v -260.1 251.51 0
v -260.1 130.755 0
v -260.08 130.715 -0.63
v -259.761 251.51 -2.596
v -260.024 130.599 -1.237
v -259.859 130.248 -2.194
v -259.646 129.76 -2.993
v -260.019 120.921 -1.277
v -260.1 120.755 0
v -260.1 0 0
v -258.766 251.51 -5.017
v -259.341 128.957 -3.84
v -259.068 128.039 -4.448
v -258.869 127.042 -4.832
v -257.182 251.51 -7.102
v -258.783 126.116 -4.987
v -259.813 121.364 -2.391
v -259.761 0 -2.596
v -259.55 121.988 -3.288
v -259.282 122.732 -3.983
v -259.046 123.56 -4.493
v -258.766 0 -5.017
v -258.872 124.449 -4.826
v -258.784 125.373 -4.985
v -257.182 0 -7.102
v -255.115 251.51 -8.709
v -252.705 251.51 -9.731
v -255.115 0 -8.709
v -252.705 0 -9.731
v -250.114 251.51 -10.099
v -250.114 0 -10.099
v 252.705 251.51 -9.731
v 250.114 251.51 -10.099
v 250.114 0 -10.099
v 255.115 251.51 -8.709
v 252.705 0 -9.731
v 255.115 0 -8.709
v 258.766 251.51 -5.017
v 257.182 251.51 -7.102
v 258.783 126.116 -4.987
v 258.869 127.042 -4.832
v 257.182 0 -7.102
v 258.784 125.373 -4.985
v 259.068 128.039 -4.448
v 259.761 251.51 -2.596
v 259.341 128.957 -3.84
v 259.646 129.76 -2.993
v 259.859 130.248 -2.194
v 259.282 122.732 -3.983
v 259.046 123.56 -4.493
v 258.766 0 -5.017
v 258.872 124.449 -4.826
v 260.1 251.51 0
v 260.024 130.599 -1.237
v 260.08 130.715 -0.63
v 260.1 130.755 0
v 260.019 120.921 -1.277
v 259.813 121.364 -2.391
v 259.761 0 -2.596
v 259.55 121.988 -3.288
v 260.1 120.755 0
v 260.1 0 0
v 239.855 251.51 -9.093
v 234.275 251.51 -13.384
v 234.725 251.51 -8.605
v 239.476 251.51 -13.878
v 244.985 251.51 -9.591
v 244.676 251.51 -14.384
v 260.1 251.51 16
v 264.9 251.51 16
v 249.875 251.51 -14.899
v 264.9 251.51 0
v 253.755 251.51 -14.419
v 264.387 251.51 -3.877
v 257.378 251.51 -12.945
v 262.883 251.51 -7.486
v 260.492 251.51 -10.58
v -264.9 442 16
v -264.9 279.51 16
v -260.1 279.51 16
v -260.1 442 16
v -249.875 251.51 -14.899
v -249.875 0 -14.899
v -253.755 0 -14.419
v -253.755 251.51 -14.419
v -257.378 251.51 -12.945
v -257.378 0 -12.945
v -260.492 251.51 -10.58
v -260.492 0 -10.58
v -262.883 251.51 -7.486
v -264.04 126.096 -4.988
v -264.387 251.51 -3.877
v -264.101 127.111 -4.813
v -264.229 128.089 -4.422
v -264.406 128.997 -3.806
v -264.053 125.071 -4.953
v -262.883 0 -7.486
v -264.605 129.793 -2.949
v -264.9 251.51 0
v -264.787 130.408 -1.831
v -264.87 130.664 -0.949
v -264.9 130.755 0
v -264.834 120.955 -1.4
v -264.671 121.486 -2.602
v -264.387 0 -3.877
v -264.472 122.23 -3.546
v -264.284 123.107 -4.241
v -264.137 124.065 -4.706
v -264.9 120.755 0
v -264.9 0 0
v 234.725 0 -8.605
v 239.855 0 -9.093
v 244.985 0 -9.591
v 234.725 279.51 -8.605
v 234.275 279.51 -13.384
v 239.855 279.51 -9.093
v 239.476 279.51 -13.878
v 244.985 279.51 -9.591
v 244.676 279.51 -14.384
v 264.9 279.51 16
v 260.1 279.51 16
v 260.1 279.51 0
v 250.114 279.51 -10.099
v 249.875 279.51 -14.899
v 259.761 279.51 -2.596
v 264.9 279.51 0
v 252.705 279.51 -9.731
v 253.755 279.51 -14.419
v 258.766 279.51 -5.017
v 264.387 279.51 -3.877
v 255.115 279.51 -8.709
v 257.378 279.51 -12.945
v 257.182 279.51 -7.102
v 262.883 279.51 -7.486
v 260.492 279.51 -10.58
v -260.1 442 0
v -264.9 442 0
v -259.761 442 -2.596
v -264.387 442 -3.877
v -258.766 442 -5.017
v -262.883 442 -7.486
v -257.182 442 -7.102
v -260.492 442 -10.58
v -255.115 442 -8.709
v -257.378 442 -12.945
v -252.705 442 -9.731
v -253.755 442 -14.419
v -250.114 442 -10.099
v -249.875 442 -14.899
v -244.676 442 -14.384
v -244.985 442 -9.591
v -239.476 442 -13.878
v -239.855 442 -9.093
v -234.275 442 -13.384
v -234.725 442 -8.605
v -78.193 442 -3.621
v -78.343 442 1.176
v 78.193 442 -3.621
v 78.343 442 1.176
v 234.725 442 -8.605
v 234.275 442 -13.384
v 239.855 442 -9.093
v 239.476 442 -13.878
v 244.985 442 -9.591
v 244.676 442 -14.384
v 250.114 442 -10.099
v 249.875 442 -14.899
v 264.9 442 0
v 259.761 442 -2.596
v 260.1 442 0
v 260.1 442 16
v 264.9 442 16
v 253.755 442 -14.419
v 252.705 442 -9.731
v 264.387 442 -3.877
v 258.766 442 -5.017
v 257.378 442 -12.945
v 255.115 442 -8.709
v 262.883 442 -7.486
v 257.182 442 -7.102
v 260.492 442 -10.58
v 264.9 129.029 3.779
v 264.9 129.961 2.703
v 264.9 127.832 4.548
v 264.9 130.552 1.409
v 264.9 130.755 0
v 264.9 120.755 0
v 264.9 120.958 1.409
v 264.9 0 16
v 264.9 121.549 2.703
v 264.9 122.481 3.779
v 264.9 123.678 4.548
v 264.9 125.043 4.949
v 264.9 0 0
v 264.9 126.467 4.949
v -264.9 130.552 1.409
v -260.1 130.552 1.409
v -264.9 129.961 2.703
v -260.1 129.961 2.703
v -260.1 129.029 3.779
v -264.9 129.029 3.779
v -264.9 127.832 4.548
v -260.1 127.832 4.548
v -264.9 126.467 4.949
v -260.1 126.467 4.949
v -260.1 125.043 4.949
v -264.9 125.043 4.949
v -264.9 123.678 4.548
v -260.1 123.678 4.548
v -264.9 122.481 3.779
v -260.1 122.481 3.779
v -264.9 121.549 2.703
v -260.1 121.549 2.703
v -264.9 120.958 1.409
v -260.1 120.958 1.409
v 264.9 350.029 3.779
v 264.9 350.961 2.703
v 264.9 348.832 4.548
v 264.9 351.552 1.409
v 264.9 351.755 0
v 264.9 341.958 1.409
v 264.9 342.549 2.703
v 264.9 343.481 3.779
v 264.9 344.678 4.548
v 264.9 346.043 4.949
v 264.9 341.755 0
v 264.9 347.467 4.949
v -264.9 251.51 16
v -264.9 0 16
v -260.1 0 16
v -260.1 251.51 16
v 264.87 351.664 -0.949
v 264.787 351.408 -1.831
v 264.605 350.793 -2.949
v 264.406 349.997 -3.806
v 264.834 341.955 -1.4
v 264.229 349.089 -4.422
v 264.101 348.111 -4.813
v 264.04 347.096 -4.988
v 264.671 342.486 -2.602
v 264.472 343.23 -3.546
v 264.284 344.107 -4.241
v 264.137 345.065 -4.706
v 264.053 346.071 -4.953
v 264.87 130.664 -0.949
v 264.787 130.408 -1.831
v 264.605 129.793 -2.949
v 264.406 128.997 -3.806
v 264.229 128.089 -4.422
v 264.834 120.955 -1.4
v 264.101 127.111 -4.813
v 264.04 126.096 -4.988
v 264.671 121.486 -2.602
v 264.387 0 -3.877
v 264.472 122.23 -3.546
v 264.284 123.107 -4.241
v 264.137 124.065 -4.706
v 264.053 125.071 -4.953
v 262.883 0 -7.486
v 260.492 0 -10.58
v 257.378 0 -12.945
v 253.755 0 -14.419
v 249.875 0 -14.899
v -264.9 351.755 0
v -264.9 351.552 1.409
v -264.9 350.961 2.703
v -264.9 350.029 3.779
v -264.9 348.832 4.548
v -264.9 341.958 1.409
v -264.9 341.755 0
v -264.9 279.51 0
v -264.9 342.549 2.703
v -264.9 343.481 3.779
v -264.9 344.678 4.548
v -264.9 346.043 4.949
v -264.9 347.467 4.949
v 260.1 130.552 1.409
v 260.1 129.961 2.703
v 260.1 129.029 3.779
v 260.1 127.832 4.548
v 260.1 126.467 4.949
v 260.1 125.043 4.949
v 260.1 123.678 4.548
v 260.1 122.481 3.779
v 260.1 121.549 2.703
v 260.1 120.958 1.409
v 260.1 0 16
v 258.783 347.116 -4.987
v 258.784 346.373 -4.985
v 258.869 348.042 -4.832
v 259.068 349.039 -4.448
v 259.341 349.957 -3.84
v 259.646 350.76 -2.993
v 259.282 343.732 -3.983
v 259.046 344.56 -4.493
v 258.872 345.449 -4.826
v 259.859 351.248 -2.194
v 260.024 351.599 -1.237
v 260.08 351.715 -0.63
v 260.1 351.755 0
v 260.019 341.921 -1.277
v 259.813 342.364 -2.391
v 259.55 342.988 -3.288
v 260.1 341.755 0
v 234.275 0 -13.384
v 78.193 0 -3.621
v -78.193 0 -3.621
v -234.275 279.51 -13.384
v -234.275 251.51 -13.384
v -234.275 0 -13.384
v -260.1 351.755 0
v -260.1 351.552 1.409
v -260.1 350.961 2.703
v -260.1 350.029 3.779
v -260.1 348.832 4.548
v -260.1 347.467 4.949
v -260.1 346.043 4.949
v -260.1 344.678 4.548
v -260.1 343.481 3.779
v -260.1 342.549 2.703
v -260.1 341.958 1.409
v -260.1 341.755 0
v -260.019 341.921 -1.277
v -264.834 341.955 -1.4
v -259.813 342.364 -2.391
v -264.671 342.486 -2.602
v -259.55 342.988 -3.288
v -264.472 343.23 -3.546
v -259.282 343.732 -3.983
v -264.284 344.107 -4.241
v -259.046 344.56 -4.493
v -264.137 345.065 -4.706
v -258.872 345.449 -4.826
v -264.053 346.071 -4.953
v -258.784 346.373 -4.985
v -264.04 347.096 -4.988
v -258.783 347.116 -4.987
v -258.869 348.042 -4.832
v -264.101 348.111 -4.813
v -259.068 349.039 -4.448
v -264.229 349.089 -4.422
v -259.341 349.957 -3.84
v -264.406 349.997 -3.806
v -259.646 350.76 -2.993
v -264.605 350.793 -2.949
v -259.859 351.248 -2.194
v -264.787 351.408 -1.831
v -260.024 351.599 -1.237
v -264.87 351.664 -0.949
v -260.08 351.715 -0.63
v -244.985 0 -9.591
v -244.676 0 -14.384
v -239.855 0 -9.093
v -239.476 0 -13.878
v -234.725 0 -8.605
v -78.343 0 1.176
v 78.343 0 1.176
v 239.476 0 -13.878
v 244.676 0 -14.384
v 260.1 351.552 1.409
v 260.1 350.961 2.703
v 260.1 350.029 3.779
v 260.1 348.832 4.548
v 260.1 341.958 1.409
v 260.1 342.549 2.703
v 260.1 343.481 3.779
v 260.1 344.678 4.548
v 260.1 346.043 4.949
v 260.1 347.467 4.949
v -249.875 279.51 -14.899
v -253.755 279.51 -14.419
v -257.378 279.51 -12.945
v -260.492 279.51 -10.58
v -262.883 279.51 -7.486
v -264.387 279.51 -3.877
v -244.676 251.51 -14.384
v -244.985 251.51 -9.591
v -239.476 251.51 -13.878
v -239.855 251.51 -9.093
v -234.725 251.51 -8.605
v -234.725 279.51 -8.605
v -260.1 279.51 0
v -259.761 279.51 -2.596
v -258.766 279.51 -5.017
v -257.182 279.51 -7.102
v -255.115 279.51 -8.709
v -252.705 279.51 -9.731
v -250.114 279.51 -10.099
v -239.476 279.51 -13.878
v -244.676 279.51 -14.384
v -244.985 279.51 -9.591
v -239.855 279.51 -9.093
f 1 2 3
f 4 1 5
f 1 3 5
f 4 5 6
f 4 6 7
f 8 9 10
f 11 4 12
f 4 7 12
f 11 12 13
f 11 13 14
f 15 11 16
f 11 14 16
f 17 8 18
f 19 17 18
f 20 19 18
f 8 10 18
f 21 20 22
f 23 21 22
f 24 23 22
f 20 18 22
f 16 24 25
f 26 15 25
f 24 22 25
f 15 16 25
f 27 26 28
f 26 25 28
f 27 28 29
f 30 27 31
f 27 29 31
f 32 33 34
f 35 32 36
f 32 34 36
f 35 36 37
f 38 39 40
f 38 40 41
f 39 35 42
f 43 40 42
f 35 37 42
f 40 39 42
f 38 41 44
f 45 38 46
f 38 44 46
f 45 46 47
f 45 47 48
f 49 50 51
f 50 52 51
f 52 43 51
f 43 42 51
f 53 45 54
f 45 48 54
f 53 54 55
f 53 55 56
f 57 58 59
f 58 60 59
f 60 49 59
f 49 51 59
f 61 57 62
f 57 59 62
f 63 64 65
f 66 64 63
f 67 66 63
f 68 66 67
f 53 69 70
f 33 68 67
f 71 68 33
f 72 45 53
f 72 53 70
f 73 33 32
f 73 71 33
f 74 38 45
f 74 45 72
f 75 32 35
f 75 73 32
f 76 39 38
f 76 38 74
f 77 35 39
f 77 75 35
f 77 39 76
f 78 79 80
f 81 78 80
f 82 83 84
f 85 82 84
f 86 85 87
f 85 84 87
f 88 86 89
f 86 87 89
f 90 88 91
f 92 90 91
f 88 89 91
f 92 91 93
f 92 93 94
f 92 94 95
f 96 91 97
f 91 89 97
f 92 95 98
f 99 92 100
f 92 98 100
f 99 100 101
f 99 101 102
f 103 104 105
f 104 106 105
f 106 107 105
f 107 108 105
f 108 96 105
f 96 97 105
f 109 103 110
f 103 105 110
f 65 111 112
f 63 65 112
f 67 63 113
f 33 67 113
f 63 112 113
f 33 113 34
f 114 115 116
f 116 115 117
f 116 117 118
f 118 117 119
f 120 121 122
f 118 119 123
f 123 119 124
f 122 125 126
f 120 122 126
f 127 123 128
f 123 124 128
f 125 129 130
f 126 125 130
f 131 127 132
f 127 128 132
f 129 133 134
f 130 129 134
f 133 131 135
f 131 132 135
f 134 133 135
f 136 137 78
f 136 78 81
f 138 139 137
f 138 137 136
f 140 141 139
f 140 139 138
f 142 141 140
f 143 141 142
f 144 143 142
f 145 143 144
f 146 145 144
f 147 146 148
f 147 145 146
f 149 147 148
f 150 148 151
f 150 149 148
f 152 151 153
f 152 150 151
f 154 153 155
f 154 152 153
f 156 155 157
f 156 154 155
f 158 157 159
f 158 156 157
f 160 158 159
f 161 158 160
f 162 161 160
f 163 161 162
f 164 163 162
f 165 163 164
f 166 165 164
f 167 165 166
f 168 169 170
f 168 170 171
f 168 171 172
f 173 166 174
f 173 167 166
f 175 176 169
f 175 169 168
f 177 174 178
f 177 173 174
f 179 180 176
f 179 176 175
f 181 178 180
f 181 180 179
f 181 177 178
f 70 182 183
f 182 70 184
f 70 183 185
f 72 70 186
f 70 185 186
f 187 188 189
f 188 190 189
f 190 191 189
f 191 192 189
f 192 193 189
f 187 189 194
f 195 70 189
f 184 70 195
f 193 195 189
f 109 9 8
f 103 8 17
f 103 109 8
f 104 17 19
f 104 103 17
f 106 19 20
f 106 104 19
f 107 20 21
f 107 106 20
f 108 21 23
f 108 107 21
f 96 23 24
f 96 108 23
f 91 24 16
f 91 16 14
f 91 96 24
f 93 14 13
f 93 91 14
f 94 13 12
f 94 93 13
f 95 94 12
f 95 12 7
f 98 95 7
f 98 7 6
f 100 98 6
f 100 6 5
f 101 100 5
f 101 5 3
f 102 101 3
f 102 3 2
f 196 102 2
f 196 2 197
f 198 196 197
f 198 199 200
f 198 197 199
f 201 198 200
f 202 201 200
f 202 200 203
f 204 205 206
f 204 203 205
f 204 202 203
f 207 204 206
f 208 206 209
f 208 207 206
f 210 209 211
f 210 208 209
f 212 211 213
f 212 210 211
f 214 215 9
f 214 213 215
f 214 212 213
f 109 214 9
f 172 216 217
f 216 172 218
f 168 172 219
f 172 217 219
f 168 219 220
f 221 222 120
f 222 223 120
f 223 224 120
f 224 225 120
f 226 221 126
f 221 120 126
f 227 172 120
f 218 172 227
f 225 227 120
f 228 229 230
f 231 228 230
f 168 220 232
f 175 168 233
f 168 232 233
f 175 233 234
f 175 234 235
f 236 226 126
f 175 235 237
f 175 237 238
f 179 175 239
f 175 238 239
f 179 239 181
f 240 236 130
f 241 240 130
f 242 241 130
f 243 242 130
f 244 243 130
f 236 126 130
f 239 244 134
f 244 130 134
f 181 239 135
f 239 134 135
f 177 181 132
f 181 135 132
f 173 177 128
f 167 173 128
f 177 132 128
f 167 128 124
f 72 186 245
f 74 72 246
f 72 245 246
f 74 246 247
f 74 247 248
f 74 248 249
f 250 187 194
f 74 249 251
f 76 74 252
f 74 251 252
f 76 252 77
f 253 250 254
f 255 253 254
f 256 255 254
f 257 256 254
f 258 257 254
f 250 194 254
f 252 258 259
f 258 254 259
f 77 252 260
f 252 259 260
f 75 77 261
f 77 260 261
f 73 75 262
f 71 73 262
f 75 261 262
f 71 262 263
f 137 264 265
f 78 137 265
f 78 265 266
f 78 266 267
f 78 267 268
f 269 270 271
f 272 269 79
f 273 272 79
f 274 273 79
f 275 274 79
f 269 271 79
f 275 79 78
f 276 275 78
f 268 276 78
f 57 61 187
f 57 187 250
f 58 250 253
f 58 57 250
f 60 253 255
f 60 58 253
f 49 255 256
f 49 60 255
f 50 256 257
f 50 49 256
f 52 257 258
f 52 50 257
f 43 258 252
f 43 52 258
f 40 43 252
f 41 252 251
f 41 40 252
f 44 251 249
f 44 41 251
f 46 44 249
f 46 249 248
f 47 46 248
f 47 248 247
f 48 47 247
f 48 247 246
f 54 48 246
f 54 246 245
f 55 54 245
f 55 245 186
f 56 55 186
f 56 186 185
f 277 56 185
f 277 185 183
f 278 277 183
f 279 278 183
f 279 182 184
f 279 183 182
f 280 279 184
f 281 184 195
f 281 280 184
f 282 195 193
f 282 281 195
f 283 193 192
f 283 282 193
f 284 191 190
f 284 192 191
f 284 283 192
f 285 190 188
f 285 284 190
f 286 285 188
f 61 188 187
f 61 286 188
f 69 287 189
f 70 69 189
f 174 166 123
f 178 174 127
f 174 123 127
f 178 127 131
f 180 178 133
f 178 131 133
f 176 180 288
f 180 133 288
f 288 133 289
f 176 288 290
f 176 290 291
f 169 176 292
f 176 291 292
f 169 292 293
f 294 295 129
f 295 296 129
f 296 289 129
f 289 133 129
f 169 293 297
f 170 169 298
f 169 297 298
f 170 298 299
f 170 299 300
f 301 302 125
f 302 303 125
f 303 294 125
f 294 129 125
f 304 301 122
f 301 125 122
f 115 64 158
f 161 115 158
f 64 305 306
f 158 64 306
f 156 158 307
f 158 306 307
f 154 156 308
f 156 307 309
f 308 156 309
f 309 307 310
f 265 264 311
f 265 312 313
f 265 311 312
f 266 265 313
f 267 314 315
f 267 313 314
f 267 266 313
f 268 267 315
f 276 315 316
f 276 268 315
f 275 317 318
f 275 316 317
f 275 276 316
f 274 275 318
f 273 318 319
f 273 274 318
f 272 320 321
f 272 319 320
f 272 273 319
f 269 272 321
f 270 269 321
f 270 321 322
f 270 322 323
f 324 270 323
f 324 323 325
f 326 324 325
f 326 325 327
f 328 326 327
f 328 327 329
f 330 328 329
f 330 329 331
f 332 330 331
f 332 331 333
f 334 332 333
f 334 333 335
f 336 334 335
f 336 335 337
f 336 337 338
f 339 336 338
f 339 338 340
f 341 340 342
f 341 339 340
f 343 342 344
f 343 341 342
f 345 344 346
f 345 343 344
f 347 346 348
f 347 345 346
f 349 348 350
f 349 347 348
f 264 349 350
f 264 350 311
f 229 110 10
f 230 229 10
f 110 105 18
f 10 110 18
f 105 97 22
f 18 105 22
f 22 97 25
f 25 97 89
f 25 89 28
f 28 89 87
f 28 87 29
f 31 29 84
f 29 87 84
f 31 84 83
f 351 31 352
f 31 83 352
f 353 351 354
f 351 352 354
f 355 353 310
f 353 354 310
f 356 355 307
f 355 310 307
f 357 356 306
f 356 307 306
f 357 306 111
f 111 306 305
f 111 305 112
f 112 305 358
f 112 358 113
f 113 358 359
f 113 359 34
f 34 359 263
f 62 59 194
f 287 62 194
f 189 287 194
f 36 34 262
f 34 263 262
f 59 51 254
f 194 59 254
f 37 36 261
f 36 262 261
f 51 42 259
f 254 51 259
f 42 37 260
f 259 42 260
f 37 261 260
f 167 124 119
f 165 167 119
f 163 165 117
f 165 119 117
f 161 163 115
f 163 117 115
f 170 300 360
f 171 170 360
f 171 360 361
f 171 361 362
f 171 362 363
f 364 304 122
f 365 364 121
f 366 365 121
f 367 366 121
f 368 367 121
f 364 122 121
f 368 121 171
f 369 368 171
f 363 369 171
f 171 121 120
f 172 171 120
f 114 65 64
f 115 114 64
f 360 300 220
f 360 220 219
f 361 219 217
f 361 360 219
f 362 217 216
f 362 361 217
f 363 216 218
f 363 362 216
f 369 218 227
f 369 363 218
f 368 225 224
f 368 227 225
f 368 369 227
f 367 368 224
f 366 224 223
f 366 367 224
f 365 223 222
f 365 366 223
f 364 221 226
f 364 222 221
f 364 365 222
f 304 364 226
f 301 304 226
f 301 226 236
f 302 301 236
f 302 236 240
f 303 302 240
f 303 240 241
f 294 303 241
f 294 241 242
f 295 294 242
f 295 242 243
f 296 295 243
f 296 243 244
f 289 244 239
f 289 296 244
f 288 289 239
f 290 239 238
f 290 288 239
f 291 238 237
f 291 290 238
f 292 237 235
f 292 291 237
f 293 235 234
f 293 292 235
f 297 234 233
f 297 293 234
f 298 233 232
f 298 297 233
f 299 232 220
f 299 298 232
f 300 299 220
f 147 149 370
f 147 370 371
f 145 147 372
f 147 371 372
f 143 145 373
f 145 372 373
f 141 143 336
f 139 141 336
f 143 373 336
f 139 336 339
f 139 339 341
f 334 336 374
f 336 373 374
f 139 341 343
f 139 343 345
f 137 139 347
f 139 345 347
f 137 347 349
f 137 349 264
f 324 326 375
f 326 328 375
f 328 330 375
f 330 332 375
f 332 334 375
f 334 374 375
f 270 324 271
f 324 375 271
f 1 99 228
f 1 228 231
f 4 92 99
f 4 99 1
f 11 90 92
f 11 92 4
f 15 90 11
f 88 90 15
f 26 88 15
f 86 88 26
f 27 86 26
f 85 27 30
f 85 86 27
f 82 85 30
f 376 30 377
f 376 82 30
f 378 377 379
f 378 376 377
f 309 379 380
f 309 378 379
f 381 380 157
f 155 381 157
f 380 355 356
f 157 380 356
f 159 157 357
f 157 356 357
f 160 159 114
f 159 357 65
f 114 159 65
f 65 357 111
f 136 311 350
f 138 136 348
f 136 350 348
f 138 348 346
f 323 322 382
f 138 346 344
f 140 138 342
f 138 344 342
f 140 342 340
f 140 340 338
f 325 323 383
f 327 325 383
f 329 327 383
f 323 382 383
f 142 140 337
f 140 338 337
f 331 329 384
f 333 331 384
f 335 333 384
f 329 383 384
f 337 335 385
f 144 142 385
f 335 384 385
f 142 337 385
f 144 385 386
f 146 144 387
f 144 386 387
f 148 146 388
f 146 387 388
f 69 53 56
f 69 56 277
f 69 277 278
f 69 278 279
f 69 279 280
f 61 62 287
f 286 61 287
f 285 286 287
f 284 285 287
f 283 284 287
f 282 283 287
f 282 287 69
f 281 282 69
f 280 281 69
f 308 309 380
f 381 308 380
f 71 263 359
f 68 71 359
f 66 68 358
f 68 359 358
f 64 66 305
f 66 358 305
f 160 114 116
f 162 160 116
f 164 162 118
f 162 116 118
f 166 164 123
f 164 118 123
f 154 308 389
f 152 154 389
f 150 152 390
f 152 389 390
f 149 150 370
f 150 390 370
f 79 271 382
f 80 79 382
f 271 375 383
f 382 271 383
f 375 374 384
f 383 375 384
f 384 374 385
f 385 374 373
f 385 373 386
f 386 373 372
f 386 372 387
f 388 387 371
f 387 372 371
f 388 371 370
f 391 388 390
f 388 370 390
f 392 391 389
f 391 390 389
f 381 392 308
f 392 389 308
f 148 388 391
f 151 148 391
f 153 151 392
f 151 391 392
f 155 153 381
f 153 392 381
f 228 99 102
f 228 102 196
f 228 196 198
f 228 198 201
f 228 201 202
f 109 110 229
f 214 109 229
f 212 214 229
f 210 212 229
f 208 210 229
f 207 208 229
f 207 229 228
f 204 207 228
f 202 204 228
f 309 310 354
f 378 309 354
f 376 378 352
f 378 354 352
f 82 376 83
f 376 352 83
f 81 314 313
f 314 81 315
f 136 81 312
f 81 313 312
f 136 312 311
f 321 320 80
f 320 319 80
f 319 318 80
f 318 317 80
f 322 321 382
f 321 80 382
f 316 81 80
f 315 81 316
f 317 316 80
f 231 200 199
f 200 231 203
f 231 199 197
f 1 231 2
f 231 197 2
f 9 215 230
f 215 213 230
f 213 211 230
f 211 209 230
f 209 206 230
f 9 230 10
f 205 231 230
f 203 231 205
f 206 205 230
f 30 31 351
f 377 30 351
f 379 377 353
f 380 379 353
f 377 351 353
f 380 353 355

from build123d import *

# Parameters (mm, degrees)
THICKEN1_DEPTH     = 442
THICKEN1_2_DEPTH   = 251.51
THICKEN1_START     = 279.51
THICKEN1_3_DEPTH   = 162.49
SKETCH4_R          = 5
CUT_EXTRUDE1_DEPTH = 20
SKETCH5_R          = 5
CUT_EXTRUDE2_DEPTH = 20
CUT_EXTRUDE3_START = -20
SKETCH7_R          = 5
CUT_EXTRUDE3_DEPTH = 20


# Read off the part's stored shape, not the designer's step: Thicken1
with BuildPart() as part:
    # Thicken1 outline → Thicken1 (new body)
    with BuildSketch(Plane(origin=(0, 0, 0), x_dir=(1, 0, 0), z_dir=(0, 1, 0))):
        with BuildLine():
            ThreePointArc((-234.724558603, 8.605268641), (0, -2.4), (234.724558603, 8.605268641))
            Line((234.724558603, 8.605268641), (234.275441397, 13.384211383))
            ThreePointArc((234.275441397, 13.384211383), (0, 2.4), (-234.275441397, 13.384211383))
            Line((-234.275441397, 13.384211383), (-234.724558603, 8.605268641))
        make_face()
    extrude(amount=THICKEN1_DEPTH)

    # Thicken1 2 outline → Thicken1 2 (add)
    with BuildSketch(Plane(origin=(0, 0, 0), x_dir=(1, 0, 0), z_dir=(0, 1, 0))):
        with BuildLine():
            Line((234.275441397, 13.384211383), (234.724558603, 8.605268641))
            ThreePointArc((234.724558603, 8.605268641), (242.420228217, 9.340459098), (250.113595715, 10.099361169))
            ThreePointArc((250.113595715, 10.099361169), (257.181828344, 7.101502773), (260.1, 0))
            Line((260.1, 0), (260.1, -16))
            Line((260.1, -16), (264.9, -16))
            Line((264.9, -16), (264.9, 0))
            ThreePointArc((264.9, 0), (260.491504347, 10.580091518), (249.874719929, 14.89947331))
            ThreePointArc((249.874719929, 14.89947331), (242.076266252, 14.129636973), (234.275441397, 13.384211383))
        make_face()
        with BuildLine():
            ThreePointArc((-250.113595715, 10.099361169), (-242.420228217, 9.340459098), (-234.724558603, 8.605268641))
            Line((-234.724558603, 8.605268641), (-234.275441397, 13.384211383))
            ThreePointArc((-234.275441397, 13.384211383), (-242.076266252, 14.129636973), (-249.874719929, 14.89947331))
            ThreePointArc((-249.874719929, 14.89947331), (-260.491504347, 10.580091518), (-264.9, 0))
            Line((-264.9, 0), (-264.9, -16))
            Line((-264.9, -16), (-260.1, -16))
            Line((-260.1, -16), (-260.1, 0))
            ThreePointArc((-260.1, 0), (-257.181828344, 7.101502773), (-250.113595715, 10.099361169))
        make_face()
    extrude(amount=THICKEN1_2_DEPTH)

    # Thicken1 3 outline → Thicken1 3 (add)
    with BuildSketch(Plane(origin=(0, 0, 0), x_dir=(1, 0, 0), z_dir=(0, 1, 0)).offset(THICKEN1_START)):
        with BuildLine():
            Line((234.275441397, 13.384211383), (234.724558603, 8.605268641))
            ThreePointArc((234.724558603, 8.605268641), (242.420228217, 9.340459098), (250.113595715, 10.099361169))
            ThreePointArc((250.113595715, 10.099361169), (257.181828344, 7.101502773), (260.1, 0))
            Line((260.1, 0), (260.1, -16))
            Line((260.1, -16), (264.9, -16))
            Line((264.9, -16), (264.9, 0))
            ThreePointArc((264.9, 0), (260.491504347, 10.580091518), (249.874719929, 14.89947331))
            ThreePointArc((249.874719929, 14.89947331), (242.076266252, 14.129636973), (234.275441397, 13.384211383))
        make_face()
        with BuildLine():
            ThreePointArc((-250.113595715, 10.099361169), (-242.420228217, 9.340459098), (-234.724558603, 8.605268641))
            Line((-234.724558603, 8.605268641), (-234.275441397, 13.384211383))
            ThreePointArc((-234.275441397, 13.384211383), (-242.076266252, 14.129636973), (-249.874719929, 14.89947331))
            ThreePointArc((-249.874719929, 14.89947331), (-260.491504347, 10.580091518), (-264.9, 0))
            Line((-264.9, 0), (-264.9, -16))
            Line((-264.9, -16), (-260.1, -16))
            Line((-260.1, -16), (-260.1, 0))
            ThreePointArc((-260.1, 0), (-257.181828344, 7.101502773), (-250.113595715, 10.099361169))
        make_face()
    extrude(amount=THICKEN1_3_DEPTH)

    # Sketch4 → Cut-Extrude1 (cut)
    with BuildSketch(Plane(origin=(250, 0, 0), x_dir=(0, 0, -1), z_dir=(1, 0, 0))):
        with Locations(Location((0, 346.755, 0), (0, 0, 90))):
            Circle(SKETCH4_R)
    extrude(amount=CUT_EXTRUDE1_DEPTH, mode=Mode.SUBTRACT)

    # Sketch5 → Cut-Extrude2 (cut)
    with BuildSketch(Plane(origin=(250, 0, 0), x_dir=(0, 0, -1), z_dir=(1, 0, 0))):
        with Locations(Location((0, 125.755, 0), (0, 0, 270))):
            Circle(SKETCH5_R)
    extrude(amount=CUT_EXTRUDE2_DEPTH, mode=Mode.SUBTRACT)

    # Sketch7 → Cut-Extrude3 (cut)
    with BuildSketch(Plane(origin=(-250, 0, 0), x_dir=(0, 0, -1), z_dir=(1, 0, 0)).offset(CUT_EXTRUDE3_START)):
        with Locations(Location((0, 346.755, 0), (0, 0, 90))):
            Circle(SKETCH7_R)
        with Locations(Location((0, 125.755, 0), (0, 0, 270))):
            Circle(SKETCH7_R)
    extrude(amount=CUT_EXTRUDE3_DEPTH, mode=Mode.SUBTRACT)


solid = part.part
